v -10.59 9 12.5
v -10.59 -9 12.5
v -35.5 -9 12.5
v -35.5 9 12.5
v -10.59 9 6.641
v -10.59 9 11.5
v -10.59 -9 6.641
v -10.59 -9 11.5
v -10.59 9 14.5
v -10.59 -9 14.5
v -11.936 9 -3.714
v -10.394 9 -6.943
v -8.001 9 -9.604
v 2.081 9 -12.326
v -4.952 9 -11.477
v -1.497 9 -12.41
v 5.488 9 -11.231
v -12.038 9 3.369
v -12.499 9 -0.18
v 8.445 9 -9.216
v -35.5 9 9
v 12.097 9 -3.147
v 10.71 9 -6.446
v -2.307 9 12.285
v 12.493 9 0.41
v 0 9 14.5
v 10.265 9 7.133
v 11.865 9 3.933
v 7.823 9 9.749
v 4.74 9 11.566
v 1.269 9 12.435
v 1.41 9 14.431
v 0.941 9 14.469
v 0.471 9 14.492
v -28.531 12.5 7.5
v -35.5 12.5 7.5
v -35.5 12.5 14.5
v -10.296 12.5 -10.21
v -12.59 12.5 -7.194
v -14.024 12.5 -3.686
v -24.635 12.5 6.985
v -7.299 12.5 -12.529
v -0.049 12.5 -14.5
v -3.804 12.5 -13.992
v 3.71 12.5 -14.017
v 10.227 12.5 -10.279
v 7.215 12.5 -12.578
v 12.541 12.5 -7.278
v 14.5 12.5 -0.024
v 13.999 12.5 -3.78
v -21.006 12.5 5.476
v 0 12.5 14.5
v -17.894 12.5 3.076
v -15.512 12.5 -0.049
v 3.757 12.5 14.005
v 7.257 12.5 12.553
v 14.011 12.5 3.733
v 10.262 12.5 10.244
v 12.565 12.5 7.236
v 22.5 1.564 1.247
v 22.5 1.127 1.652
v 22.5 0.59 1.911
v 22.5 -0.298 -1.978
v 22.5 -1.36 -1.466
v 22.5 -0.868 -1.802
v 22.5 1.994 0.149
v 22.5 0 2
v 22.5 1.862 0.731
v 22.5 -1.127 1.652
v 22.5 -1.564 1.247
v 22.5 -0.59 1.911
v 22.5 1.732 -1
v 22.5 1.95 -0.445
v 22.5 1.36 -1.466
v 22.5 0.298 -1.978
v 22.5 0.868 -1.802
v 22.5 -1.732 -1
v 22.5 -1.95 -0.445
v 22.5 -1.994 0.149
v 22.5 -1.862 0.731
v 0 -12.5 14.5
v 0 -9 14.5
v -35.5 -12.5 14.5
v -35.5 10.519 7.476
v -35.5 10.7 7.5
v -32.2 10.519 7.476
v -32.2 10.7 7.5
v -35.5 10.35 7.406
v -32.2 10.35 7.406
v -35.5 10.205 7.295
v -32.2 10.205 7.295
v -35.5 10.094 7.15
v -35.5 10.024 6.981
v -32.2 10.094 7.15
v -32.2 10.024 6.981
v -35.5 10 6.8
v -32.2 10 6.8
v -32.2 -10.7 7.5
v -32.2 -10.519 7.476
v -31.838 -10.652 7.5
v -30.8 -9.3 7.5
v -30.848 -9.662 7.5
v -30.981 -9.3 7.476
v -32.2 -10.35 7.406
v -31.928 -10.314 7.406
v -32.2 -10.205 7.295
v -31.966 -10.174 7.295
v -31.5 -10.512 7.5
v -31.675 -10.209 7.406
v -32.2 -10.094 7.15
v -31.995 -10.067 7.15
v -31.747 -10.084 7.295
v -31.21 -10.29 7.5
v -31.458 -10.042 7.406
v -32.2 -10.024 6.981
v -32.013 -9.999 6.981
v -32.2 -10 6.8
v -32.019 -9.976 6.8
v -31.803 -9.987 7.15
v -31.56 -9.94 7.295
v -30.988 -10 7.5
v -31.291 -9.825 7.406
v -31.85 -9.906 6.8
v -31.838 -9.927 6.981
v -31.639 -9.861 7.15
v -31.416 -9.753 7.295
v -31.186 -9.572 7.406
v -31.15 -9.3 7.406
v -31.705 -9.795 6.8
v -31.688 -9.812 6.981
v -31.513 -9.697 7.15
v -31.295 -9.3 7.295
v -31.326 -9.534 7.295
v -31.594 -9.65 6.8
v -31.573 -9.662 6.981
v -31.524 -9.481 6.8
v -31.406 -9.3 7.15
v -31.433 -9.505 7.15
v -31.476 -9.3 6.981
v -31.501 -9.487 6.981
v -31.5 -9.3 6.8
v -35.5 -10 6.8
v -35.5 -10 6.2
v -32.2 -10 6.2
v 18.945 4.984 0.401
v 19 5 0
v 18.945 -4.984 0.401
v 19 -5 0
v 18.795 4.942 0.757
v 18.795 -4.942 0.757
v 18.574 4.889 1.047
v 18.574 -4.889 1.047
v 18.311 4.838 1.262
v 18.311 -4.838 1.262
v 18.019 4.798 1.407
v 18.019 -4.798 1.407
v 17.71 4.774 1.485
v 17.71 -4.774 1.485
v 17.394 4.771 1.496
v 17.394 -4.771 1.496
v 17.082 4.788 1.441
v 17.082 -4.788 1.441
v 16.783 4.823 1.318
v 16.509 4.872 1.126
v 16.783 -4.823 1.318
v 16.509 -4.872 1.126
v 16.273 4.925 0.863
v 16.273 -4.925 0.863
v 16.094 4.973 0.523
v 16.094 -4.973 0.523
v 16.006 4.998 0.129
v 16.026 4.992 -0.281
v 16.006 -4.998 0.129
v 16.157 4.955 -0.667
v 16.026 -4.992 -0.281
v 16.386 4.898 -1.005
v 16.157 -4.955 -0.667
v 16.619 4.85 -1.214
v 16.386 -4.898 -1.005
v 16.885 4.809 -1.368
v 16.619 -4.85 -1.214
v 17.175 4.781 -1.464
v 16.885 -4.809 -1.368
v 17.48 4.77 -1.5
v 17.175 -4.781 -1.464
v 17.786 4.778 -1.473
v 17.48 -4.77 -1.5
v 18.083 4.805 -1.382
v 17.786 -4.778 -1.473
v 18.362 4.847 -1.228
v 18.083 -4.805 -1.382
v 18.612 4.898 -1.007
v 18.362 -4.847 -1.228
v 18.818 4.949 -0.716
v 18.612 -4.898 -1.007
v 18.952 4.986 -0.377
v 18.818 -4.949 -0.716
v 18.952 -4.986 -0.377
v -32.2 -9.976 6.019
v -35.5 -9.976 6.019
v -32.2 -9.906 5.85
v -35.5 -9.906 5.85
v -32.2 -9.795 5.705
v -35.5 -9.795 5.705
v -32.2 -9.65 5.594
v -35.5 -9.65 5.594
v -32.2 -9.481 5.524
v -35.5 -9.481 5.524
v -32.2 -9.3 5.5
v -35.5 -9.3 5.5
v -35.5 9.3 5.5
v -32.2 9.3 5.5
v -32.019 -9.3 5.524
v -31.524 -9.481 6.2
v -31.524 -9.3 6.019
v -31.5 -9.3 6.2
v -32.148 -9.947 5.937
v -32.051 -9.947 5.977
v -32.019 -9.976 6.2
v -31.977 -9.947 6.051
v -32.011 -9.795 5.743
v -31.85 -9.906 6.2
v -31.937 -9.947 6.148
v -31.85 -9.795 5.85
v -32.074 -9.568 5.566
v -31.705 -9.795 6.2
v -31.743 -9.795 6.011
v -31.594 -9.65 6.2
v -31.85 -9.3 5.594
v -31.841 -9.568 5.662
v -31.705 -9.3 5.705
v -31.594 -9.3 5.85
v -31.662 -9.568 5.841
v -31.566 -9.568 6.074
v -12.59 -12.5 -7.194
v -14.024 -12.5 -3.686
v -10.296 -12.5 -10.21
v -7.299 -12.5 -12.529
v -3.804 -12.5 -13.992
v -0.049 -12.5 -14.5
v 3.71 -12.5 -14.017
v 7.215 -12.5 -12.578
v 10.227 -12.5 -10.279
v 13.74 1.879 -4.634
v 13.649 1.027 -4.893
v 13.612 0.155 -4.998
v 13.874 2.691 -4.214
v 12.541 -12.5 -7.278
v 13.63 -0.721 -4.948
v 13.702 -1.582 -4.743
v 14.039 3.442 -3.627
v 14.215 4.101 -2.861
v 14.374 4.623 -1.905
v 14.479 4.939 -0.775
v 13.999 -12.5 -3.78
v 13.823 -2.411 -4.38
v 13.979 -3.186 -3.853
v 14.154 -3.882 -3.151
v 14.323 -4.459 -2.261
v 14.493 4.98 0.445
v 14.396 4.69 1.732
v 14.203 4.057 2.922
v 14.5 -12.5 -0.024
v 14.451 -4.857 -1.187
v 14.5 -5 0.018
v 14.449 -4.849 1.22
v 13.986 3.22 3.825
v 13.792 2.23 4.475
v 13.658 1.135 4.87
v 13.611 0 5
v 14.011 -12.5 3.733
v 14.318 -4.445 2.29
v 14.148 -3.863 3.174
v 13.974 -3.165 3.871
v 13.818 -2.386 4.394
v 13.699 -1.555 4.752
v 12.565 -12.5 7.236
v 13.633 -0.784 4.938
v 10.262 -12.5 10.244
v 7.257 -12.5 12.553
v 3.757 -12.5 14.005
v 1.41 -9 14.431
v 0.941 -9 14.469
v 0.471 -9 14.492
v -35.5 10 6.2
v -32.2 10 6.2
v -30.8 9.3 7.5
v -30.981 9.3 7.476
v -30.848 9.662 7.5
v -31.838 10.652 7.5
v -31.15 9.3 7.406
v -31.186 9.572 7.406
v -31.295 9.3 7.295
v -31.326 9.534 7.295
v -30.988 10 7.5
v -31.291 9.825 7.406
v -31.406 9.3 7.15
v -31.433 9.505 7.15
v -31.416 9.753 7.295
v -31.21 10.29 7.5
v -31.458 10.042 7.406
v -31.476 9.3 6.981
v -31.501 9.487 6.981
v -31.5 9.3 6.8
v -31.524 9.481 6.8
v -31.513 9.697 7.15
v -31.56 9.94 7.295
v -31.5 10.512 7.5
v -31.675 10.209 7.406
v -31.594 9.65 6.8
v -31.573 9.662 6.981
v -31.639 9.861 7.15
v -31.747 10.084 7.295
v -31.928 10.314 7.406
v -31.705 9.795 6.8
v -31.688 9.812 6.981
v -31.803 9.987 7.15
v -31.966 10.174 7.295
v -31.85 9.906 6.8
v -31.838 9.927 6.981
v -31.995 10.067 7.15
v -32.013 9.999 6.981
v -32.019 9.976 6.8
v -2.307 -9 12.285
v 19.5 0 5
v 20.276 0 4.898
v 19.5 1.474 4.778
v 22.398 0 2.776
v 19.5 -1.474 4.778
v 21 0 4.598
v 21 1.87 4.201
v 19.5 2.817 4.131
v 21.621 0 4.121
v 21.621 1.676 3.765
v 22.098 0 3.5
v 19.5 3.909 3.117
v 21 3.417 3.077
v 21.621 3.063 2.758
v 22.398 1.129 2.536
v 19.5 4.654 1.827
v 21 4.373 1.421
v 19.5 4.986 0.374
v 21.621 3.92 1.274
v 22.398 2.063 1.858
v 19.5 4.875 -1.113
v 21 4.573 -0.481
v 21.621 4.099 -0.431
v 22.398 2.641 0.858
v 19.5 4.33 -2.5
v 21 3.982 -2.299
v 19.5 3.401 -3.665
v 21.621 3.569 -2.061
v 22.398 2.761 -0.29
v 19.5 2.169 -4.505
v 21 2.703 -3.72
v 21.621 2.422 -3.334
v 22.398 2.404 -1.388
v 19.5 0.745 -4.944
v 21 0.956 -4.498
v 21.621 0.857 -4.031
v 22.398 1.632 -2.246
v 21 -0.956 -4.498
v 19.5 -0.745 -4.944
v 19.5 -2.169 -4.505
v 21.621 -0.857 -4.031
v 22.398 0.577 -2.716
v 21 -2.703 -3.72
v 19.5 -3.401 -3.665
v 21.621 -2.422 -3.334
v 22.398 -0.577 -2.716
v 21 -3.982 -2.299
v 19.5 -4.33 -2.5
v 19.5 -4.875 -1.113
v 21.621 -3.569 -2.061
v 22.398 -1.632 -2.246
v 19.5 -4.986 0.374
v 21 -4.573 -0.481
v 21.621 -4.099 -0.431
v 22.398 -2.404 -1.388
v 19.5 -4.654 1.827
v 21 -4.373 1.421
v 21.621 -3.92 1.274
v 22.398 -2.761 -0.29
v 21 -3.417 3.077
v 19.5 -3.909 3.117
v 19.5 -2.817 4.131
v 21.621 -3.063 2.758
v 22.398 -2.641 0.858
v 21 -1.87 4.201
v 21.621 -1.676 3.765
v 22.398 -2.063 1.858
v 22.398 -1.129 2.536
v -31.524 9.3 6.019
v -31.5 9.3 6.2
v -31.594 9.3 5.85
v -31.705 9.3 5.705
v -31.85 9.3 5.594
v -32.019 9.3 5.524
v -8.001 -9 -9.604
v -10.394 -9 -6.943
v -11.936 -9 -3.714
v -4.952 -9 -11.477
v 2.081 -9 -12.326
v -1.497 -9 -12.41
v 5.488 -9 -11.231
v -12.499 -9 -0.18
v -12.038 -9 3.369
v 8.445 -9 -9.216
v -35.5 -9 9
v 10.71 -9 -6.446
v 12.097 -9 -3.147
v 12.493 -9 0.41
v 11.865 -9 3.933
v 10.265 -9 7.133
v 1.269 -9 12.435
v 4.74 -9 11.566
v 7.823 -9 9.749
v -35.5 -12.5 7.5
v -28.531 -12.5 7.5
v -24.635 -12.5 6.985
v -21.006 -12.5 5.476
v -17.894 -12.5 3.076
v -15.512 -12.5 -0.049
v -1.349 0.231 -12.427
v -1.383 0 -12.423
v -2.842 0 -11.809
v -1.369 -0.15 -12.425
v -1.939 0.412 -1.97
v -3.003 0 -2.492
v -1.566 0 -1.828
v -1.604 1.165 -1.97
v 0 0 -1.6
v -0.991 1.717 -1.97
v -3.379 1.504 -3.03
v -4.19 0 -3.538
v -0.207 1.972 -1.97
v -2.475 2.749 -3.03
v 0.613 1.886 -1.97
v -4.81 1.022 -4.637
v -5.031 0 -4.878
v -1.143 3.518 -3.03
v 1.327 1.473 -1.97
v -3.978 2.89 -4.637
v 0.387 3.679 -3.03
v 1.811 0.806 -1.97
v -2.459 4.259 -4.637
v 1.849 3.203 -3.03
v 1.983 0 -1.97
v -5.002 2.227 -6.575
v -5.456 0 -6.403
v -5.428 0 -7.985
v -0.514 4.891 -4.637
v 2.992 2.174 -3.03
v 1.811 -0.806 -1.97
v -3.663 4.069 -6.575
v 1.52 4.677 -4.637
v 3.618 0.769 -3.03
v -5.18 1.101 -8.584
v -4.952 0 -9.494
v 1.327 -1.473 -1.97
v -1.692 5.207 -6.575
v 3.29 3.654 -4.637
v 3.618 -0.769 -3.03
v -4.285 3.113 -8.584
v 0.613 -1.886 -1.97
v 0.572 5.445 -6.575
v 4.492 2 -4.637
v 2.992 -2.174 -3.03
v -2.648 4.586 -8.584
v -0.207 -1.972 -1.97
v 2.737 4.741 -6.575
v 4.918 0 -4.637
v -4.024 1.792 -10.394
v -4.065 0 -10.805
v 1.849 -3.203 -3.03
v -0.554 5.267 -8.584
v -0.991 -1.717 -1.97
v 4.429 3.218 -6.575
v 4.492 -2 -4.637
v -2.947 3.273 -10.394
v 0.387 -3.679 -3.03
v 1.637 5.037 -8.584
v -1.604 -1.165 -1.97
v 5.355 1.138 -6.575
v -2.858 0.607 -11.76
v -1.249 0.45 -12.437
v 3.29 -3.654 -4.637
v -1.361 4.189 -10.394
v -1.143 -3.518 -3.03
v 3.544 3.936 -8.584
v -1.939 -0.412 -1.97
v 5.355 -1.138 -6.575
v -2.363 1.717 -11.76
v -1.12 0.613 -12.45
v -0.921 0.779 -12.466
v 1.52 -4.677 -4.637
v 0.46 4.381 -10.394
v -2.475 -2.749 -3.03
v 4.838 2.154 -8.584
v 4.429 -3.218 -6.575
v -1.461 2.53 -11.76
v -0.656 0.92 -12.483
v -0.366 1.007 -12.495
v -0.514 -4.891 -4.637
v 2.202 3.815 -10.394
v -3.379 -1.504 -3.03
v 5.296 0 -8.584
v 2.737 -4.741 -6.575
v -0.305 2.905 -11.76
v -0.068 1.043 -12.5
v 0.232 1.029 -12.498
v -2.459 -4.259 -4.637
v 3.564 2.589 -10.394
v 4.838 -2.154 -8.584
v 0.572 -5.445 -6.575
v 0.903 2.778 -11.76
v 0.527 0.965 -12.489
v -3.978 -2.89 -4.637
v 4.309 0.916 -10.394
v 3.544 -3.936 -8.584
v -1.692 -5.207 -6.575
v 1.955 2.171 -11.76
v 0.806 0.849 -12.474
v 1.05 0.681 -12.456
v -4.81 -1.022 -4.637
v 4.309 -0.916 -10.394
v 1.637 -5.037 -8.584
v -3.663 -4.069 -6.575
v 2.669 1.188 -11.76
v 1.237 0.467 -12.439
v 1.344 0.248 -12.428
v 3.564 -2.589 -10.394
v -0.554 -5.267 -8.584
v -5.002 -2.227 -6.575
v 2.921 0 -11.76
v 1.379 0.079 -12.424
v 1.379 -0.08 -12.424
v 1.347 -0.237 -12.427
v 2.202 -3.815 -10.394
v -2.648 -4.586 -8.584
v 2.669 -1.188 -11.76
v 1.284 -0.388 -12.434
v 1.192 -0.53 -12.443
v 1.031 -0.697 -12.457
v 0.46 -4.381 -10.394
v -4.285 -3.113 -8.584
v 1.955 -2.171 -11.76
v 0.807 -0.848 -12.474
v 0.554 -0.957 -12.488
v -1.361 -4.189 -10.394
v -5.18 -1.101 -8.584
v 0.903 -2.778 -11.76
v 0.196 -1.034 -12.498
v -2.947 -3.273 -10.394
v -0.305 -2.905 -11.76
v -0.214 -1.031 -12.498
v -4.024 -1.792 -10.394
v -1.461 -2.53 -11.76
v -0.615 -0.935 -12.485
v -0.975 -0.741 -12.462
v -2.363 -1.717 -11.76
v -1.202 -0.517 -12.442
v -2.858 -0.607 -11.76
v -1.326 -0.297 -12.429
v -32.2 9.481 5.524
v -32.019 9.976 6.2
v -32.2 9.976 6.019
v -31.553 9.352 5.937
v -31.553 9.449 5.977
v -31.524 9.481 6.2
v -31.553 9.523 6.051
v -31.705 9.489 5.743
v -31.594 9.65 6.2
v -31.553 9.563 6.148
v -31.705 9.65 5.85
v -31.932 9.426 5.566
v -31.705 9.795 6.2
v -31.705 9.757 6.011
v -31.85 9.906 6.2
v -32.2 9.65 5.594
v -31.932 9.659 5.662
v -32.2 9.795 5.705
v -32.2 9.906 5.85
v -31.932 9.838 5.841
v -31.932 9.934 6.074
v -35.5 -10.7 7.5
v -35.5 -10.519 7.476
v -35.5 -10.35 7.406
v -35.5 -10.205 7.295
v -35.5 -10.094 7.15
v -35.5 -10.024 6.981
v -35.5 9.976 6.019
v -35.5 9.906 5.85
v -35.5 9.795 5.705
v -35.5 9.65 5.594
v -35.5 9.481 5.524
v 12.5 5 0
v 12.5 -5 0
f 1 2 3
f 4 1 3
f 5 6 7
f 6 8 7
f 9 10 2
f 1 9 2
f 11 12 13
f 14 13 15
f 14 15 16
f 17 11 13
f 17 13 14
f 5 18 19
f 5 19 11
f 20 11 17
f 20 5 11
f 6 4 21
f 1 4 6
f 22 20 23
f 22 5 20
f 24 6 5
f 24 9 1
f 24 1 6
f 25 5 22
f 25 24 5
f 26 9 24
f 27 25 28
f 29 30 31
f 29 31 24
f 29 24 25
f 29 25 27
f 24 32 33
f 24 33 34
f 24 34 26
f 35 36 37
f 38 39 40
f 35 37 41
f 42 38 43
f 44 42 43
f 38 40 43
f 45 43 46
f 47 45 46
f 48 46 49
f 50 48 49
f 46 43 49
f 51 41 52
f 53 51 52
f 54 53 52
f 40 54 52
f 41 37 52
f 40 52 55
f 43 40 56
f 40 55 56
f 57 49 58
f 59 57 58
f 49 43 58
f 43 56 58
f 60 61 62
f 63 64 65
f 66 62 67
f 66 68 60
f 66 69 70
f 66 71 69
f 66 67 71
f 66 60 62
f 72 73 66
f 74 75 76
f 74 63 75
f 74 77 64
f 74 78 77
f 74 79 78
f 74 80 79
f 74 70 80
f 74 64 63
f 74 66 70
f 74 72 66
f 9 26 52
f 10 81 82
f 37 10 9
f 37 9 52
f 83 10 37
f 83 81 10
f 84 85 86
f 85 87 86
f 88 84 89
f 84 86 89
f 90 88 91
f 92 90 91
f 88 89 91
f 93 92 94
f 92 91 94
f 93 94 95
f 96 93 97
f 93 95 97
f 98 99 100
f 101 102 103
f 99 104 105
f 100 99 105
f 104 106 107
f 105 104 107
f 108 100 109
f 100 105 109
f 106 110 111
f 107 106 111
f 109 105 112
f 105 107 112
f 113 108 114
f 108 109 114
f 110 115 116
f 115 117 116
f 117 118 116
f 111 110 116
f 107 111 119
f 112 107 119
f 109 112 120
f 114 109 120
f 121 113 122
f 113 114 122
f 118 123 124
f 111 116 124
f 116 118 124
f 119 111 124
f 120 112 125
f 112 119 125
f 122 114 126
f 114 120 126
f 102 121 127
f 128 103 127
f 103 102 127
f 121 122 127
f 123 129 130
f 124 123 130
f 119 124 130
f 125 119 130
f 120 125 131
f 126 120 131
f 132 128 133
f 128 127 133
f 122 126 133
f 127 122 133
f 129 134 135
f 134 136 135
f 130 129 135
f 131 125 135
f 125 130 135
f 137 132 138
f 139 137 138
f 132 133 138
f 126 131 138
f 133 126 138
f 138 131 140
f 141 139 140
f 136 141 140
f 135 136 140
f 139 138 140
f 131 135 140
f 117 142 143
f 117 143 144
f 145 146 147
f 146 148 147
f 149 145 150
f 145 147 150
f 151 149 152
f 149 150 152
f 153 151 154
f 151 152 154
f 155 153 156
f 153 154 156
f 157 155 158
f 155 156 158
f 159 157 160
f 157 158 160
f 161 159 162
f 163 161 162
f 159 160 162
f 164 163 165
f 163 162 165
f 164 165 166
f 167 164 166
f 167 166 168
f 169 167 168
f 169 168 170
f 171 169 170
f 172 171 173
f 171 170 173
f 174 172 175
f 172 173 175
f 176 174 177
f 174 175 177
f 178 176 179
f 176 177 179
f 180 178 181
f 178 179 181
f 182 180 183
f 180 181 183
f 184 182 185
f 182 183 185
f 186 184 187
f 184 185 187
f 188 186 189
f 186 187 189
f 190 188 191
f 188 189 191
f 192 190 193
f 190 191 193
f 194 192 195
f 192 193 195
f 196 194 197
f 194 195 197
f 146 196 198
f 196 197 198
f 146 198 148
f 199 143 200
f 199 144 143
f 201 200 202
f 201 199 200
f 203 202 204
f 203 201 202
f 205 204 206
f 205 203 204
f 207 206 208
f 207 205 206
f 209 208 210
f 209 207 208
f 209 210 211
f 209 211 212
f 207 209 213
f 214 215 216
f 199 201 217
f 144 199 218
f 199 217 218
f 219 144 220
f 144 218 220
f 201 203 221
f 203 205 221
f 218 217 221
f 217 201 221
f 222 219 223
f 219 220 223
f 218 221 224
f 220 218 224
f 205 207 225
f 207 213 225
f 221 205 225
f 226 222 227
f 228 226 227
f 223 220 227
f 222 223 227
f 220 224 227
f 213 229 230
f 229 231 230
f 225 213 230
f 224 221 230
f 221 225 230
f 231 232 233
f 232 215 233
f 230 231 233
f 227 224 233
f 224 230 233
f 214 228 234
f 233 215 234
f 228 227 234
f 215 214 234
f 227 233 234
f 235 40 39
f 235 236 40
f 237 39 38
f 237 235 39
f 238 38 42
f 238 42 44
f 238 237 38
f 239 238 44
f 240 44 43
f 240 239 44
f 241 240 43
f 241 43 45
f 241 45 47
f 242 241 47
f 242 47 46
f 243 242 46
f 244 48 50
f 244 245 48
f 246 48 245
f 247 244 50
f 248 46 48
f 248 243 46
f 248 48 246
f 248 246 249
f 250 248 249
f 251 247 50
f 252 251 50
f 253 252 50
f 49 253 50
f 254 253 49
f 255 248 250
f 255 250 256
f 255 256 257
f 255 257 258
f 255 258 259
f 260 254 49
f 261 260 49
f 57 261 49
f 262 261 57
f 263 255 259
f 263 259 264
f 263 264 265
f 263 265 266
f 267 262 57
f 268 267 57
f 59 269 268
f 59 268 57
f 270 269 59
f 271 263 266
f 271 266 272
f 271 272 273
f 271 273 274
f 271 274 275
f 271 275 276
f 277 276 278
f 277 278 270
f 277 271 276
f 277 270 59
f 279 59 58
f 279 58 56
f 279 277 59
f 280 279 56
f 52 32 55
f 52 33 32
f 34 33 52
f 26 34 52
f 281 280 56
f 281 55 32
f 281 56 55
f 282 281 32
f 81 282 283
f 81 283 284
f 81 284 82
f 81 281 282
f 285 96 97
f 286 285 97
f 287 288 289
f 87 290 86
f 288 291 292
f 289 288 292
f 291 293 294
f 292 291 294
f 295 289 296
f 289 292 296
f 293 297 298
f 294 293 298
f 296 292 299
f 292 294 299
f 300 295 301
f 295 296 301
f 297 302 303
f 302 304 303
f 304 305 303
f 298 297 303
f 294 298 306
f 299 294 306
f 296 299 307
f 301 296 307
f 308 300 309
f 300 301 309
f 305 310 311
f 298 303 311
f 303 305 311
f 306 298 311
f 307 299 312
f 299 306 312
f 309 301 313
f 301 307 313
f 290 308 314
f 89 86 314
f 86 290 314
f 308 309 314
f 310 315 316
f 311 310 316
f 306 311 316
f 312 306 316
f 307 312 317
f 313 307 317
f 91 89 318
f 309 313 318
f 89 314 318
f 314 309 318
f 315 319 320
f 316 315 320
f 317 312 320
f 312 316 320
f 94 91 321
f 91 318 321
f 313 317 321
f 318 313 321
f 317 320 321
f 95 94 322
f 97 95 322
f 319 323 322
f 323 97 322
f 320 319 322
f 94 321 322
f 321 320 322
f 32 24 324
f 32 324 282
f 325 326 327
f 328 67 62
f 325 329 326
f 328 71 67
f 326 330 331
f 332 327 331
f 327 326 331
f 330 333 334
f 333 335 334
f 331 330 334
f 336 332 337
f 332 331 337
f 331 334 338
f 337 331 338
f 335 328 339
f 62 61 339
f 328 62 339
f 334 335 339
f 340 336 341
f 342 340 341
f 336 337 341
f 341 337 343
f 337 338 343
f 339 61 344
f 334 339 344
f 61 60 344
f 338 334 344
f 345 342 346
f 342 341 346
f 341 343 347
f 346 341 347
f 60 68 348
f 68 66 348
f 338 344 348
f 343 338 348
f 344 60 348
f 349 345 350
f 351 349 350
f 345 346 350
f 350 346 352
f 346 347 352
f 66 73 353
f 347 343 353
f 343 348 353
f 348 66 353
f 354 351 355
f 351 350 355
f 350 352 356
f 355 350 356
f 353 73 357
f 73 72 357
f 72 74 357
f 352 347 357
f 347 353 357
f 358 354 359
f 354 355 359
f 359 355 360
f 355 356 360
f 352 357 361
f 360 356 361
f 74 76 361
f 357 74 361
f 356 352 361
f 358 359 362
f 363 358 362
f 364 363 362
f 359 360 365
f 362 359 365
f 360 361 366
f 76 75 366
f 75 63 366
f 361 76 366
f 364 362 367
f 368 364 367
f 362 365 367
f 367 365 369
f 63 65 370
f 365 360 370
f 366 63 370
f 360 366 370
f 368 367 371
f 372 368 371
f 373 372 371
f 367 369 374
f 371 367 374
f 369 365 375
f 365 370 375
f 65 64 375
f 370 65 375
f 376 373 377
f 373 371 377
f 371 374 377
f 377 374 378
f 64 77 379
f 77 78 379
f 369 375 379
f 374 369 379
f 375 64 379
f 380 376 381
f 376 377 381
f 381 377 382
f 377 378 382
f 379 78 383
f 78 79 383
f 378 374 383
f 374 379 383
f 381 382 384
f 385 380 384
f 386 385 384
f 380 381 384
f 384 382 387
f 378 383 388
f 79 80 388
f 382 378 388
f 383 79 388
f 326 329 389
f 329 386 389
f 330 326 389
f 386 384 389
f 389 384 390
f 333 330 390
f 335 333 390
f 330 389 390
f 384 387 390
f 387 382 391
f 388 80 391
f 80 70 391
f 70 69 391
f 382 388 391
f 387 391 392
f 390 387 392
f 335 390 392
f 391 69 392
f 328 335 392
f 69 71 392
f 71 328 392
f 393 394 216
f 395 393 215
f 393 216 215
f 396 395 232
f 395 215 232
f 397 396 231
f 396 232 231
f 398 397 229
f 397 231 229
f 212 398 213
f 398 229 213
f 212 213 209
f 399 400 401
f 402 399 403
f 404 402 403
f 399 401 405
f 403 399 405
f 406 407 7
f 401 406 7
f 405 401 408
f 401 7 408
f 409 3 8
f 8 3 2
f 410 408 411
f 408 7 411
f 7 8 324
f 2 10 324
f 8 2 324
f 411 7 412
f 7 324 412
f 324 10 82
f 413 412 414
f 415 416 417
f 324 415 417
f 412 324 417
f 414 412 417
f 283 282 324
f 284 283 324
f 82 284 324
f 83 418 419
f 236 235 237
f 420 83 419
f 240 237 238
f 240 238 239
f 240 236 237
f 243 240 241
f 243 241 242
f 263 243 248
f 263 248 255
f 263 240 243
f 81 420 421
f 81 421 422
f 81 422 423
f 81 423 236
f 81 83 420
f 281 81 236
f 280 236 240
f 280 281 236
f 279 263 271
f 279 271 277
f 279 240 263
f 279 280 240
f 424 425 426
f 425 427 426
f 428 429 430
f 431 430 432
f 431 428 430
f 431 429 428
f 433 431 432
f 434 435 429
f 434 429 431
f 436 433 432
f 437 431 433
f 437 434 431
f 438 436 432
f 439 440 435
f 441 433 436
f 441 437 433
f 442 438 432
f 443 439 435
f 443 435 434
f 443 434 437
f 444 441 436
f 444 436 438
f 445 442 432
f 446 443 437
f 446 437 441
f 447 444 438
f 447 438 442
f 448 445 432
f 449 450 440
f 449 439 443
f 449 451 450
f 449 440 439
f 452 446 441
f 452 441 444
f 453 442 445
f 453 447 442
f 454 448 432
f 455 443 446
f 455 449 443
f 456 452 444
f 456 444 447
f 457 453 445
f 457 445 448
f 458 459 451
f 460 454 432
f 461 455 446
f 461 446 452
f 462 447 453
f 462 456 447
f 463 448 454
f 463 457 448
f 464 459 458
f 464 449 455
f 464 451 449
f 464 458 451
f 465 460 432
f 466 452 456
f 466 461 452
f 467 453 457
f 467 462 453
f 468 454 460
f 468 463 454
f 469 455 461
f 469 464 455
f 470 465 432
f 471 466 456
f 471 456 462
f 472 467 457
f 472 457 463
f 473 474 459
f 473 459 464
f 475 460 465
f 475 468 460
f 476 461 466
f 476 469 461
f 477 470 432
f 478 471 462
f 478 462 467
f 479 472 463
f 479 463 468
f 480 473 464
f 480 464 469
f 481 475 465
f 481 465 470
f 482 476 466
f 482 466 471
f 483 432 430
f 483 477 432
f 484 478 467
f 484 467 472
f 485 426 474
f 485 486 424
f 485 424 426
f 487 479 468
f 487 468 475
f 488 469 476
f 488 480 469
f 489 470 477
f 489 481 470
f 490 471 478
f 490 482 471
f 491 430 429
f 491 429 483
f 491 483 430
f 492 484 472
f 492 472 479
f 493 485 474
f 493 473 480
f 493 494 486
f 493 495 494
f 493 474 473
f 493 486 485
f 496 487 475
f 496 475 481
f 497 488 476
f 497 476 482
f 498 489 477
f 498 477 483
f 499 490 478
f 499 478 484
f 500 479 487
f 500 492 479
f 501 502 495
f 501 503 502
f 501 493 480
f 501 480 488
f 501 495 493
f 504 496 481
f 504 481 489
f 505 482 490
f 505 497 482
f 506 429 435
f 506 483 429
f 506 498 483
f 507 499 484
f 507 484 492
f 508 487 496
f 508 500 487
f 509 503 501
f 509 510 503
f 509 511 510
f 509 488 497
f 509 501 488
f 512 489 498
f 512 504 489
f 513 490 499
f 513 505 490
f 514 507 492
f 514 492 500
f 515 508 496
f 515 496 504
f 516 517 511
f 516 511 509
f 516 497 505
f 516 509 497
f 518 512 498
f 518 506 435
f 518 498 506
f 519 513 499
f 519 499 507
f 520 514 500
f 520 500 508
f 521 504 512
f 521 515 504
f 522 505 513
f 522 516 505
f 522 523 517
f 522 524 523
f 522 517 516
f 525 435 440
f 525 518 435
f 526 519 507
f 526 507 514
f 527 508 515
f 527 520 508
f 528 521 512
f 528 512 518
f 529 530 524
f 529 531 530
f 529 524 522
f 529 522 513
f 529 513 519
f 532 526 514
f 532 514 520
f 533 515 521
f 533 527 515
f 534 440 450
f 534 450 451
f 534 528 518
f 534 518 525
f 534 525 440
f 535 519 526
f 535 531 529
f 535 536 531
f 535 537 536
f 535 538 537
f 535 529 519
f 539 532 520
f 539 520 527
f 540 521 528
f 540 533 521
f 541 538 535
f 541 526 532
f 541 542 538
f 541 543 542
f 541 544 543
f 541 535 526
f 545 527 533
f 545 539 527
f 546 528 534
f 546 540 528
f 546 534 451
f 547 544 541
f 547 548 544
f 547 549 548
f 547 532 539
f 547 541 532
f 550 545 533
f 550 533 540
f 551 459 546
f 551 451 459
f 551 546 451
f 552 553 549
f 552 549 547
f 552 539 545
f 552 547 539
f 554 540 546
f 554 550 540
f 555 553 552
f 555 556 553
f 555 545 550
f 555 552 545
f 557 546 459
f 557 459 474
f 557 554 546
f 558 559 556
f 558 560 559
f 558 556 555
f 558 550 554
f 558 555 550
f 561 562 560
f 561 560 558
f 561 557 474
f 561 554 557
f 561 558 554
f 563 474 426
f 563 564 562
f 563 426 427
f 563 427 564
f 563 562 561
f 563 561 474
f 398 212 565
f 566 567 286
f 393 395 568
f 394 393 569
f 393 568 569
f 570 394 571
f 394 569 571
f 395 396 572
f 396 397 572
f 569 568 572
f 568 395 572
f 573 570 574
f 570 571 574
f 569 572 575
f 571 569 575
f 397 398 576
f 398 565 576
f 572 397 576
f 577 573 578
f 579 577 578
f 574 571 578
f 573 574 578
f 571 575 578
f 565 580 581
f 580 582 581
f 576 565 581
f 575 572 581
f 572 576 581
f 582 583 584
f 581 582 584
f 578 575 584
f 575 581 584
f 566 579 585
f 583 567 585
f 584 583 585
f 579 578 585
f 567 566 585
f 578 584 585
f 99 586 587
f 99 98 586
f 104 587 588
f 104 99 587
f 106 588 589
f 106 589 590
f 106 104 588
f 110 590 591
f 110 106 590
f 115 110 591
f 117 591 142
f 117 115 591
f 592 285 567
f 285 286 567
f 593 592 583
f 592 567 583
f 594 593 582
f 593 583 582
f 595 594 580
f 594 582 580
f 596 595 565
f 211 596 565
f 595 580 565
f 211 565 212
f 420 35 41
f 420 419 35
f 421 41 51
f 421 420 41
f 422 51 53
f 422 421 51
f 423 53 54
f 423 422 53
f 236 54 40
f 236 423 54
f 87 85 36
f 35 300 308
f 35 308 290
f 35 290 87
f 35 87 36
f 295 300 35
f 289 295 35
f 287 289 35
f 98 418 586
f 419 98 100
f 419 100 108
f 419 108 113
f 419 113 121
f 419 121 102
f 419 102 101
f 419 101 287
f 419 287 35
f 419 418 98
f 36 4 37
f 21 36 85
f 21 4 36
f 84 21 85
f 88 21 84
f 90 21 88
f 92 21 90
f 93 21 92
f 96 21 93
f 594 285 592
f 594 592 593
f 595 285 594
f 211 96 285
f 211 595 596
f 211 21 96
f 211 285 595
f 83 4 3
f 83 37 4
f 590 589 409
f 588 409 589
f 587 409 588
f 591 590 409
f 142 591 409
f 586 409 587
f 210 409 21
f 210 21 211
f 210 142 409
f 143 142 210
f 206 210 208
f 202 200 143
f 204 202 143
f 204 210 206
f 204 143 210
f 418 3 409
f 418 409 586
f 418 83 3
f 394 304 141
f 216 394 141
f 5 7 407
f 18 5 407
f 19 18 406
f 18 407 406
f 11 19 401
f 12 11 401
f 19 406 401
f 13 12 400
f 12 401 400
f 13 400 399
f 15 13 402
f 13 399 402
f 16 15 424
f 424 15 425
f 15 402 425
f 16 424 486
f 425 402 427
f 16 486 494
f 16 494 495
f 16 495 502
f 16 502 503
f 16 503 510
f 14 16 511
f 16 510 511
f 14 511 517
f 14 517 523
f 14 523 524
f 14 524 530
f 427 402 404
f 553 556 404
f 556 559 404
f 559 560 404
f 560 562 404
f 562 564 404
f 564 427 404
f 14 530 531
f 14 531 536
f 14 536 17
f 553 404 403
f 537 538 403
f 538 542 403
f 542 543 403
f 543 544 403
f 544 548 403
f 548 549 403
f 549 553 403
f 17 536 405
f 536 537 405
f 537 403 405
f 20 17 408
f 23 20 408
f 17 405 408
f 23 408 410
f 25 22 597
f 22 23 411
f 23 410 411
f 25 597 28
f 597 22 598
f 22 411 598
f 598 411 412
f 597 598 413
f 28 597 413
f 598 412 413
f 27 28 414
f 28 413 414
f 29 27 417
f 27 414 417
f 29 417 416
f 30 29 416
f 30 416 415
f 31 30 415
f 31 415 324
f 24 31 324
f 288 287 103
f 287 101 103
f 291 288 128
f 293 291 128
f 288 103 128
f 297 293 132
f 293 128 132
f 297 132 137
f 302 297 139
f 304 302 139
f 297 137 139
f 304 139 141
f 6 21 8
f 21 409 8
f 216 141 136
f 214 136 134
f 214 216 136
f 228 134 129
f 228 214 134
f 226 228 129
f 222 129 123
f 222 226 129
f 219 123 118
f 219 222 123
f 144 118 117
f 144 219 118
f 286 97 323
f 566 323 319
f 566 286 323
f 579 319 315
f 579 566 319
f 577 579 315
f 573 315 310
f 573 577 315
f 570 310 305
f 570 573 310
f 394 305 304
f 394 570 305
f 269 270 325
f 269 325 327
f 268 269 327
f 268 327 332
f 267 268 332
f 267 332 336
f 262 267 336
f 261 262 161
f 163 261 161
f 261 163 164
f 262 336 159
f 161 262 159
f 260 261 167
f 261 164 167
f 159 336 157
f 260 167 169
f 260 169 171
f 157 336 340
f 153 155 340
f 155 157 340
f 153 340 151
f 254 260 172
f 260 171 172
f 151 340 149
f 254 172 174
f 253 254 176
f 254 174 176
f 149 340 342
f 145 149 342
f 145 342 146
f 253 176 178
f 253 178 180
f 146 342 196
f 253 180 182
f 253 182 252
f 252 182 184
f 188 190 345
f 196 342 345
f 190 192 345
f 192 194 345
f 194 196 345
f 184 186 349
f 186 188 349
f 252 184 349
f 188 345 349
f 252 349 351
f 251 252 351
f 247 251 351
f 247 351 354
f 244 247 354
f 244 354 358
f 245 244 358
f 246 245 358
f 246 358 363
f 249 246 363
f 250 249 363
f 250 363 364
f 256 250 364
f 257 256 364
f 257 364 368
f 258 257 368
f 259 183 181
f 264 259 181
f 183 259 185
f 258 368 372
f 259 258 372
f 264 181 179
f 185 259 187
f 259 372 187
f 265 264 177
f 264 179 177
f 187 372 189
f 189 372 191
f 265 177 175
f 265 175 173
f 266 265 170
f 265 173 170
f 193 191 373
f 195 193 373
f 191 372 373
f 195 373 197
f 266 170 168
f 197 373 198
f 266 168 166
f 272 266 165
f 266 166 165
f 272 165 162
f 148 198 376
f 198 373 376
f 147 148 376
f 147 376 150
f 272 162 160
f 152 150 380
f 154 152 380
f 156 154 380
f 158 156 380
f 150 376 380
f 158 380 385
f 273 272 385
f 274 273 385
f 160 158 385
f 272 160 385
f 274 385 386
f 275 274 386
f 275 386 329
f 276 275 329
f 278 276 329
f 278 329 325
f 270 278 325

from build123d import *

# Parameters (mm, degrees)
F1_DEPTH      = 12.5
F3_DEPTH      = 9
F4_W          = 10
F4_H          = 5
F6_R          = 3
F7_R          = 1.5
F8_DEPTH      = 12.5010001
F8_DEPTH_BACK = 12.5010001
F9_W          = 4
F9_H          = 20
F10_DEPTH     = 2
F11_R         = 0.7
F12_R         = 15


with BuildPart() as f1:
    # F0 (on Front) → F1 (new body, symmetric)
    with BuildSketch(Plane.XZ):
        with BuildLine():
            Line((-35.5, 7.5), (-12.409673646, 7.5))
            ThreePointArc((-12.409673646, 7.5), (7.1239034244, -12.6293309403), (0, 14.5))
            Line((0, 14.5), (-35.5, 14.5))
            Line((-35.5, 14.5), (-35.5, 7.5))
        make_face()
    extrude(amount=F1_DEPTH, both=True)

    # F2 (on Front) → F3 (cut, symmetric)
    with BuildSketch(Plane.XZ):
        with BuildLine():
            Line((-10.5897720282, 11.5), (-10.5897720282, 6.6412896632))
            ThreePointArc((-10.5897720282, 6.6412896632), (7.0386819061, -10.3299059543), (-2.3066189308, 12.2853371589))
            Line((-2.3066189308, 12.2853371589), (1.4102279718, 14.4312597187))
            ThreePointArc((1.4102279718, 14.4312597187), (0.7059511596, 14.4828047339), (0, 14.5))
            Line((0, 14.5), (-10.5897720282, 14.5))
            Line((-10.5897720282, 14.5), (-10.5897720282, 12.5))
            Line((-10.5897720282, 12.5), (-35.5, 12.5))
            Line((-35.5, 12.5), (-35.5, 9))
            Line((-35.5, 9), (-10.5897720282, 11.5))
        make_face()
    extrude(amount=F3_DEPTH, both=True, mode=Mode.SUBTRACT)

    # F4 (on Front) → F5 (revolve)
    with BuildSketch(Plane.XZ):
        with Locations((17.5, 2.5)):
            Rectangle(F4_W, F4_H)
    revolve(axis=Axis((17.5, 0, 0), (-1, 0, 0)))

    # F6
    f6_edges = [f1.edges().sort_by_distance(p)[0] for p in [
        (22.5, 0, -5),
    ]]
    fillet(f6_edges, radius=F6_R)

    # F7 (on Front) → F8 (cut, two sides)
    with BuildSketch(Plane.XZ) as f8_sk:
        with Locations((17.5, 0)):
            Circle(F7_R)
    extrude(amount=-F8_DEPTH, mode=Mode.SUBTRACT)
    extrude(f8_sk.sketch, amount=F8_DEPTH_BACK, mode=Mode.SUBTRACT)

    # F9 (on face) → F10 (join)
    with BuildSketch(Plane(origin=(0, 0, 7.5), x_dir=(1, 0, 0), z_dir=(0, 0, -1))):
        with Locations((-33.5, 0)):
            Rectangle(F9_W, F9_H)
    extrude(amount=F10_DEPTH)

    # F11
    f11_edges = [f1.edges().sort_by_distance(p)[0] for p in [
        (-33.5, -10, 7.5),
        (-31.5, 0, 7.5),
        (-33.5, 10, 7.5),
        (-33.5, 10, 5.5),
        (-31.5, 0, 5.5),
        (-33.5, -10, 5.5),
        (-31.5, 10, 6.5),
        (-31.5, -10, 6.5),
    ]]
    fillet(f11_edges, radius=F11_R)

    # F12
    f12_edges = [f1.edges().sort_by_distance(p)[0] for p in [
        (-12.409674, 0, 7.5),
    ]]
    fillet(f12_edges, radius=F12_R)

    # F13 (on Front) → F14 (revolve)
    with BuildSketch(Plane.XZ):
        with BuildLine():
            Line((0, -12.6), (0, -1.6))
            ThreePointArc((0, -1.6), (-5.5, -7.1), (0, -12.6))
        make_face()
    revolve(axis=Axis((0, 0, -7.1), (0, 0, -1)))


solid = f1.part
